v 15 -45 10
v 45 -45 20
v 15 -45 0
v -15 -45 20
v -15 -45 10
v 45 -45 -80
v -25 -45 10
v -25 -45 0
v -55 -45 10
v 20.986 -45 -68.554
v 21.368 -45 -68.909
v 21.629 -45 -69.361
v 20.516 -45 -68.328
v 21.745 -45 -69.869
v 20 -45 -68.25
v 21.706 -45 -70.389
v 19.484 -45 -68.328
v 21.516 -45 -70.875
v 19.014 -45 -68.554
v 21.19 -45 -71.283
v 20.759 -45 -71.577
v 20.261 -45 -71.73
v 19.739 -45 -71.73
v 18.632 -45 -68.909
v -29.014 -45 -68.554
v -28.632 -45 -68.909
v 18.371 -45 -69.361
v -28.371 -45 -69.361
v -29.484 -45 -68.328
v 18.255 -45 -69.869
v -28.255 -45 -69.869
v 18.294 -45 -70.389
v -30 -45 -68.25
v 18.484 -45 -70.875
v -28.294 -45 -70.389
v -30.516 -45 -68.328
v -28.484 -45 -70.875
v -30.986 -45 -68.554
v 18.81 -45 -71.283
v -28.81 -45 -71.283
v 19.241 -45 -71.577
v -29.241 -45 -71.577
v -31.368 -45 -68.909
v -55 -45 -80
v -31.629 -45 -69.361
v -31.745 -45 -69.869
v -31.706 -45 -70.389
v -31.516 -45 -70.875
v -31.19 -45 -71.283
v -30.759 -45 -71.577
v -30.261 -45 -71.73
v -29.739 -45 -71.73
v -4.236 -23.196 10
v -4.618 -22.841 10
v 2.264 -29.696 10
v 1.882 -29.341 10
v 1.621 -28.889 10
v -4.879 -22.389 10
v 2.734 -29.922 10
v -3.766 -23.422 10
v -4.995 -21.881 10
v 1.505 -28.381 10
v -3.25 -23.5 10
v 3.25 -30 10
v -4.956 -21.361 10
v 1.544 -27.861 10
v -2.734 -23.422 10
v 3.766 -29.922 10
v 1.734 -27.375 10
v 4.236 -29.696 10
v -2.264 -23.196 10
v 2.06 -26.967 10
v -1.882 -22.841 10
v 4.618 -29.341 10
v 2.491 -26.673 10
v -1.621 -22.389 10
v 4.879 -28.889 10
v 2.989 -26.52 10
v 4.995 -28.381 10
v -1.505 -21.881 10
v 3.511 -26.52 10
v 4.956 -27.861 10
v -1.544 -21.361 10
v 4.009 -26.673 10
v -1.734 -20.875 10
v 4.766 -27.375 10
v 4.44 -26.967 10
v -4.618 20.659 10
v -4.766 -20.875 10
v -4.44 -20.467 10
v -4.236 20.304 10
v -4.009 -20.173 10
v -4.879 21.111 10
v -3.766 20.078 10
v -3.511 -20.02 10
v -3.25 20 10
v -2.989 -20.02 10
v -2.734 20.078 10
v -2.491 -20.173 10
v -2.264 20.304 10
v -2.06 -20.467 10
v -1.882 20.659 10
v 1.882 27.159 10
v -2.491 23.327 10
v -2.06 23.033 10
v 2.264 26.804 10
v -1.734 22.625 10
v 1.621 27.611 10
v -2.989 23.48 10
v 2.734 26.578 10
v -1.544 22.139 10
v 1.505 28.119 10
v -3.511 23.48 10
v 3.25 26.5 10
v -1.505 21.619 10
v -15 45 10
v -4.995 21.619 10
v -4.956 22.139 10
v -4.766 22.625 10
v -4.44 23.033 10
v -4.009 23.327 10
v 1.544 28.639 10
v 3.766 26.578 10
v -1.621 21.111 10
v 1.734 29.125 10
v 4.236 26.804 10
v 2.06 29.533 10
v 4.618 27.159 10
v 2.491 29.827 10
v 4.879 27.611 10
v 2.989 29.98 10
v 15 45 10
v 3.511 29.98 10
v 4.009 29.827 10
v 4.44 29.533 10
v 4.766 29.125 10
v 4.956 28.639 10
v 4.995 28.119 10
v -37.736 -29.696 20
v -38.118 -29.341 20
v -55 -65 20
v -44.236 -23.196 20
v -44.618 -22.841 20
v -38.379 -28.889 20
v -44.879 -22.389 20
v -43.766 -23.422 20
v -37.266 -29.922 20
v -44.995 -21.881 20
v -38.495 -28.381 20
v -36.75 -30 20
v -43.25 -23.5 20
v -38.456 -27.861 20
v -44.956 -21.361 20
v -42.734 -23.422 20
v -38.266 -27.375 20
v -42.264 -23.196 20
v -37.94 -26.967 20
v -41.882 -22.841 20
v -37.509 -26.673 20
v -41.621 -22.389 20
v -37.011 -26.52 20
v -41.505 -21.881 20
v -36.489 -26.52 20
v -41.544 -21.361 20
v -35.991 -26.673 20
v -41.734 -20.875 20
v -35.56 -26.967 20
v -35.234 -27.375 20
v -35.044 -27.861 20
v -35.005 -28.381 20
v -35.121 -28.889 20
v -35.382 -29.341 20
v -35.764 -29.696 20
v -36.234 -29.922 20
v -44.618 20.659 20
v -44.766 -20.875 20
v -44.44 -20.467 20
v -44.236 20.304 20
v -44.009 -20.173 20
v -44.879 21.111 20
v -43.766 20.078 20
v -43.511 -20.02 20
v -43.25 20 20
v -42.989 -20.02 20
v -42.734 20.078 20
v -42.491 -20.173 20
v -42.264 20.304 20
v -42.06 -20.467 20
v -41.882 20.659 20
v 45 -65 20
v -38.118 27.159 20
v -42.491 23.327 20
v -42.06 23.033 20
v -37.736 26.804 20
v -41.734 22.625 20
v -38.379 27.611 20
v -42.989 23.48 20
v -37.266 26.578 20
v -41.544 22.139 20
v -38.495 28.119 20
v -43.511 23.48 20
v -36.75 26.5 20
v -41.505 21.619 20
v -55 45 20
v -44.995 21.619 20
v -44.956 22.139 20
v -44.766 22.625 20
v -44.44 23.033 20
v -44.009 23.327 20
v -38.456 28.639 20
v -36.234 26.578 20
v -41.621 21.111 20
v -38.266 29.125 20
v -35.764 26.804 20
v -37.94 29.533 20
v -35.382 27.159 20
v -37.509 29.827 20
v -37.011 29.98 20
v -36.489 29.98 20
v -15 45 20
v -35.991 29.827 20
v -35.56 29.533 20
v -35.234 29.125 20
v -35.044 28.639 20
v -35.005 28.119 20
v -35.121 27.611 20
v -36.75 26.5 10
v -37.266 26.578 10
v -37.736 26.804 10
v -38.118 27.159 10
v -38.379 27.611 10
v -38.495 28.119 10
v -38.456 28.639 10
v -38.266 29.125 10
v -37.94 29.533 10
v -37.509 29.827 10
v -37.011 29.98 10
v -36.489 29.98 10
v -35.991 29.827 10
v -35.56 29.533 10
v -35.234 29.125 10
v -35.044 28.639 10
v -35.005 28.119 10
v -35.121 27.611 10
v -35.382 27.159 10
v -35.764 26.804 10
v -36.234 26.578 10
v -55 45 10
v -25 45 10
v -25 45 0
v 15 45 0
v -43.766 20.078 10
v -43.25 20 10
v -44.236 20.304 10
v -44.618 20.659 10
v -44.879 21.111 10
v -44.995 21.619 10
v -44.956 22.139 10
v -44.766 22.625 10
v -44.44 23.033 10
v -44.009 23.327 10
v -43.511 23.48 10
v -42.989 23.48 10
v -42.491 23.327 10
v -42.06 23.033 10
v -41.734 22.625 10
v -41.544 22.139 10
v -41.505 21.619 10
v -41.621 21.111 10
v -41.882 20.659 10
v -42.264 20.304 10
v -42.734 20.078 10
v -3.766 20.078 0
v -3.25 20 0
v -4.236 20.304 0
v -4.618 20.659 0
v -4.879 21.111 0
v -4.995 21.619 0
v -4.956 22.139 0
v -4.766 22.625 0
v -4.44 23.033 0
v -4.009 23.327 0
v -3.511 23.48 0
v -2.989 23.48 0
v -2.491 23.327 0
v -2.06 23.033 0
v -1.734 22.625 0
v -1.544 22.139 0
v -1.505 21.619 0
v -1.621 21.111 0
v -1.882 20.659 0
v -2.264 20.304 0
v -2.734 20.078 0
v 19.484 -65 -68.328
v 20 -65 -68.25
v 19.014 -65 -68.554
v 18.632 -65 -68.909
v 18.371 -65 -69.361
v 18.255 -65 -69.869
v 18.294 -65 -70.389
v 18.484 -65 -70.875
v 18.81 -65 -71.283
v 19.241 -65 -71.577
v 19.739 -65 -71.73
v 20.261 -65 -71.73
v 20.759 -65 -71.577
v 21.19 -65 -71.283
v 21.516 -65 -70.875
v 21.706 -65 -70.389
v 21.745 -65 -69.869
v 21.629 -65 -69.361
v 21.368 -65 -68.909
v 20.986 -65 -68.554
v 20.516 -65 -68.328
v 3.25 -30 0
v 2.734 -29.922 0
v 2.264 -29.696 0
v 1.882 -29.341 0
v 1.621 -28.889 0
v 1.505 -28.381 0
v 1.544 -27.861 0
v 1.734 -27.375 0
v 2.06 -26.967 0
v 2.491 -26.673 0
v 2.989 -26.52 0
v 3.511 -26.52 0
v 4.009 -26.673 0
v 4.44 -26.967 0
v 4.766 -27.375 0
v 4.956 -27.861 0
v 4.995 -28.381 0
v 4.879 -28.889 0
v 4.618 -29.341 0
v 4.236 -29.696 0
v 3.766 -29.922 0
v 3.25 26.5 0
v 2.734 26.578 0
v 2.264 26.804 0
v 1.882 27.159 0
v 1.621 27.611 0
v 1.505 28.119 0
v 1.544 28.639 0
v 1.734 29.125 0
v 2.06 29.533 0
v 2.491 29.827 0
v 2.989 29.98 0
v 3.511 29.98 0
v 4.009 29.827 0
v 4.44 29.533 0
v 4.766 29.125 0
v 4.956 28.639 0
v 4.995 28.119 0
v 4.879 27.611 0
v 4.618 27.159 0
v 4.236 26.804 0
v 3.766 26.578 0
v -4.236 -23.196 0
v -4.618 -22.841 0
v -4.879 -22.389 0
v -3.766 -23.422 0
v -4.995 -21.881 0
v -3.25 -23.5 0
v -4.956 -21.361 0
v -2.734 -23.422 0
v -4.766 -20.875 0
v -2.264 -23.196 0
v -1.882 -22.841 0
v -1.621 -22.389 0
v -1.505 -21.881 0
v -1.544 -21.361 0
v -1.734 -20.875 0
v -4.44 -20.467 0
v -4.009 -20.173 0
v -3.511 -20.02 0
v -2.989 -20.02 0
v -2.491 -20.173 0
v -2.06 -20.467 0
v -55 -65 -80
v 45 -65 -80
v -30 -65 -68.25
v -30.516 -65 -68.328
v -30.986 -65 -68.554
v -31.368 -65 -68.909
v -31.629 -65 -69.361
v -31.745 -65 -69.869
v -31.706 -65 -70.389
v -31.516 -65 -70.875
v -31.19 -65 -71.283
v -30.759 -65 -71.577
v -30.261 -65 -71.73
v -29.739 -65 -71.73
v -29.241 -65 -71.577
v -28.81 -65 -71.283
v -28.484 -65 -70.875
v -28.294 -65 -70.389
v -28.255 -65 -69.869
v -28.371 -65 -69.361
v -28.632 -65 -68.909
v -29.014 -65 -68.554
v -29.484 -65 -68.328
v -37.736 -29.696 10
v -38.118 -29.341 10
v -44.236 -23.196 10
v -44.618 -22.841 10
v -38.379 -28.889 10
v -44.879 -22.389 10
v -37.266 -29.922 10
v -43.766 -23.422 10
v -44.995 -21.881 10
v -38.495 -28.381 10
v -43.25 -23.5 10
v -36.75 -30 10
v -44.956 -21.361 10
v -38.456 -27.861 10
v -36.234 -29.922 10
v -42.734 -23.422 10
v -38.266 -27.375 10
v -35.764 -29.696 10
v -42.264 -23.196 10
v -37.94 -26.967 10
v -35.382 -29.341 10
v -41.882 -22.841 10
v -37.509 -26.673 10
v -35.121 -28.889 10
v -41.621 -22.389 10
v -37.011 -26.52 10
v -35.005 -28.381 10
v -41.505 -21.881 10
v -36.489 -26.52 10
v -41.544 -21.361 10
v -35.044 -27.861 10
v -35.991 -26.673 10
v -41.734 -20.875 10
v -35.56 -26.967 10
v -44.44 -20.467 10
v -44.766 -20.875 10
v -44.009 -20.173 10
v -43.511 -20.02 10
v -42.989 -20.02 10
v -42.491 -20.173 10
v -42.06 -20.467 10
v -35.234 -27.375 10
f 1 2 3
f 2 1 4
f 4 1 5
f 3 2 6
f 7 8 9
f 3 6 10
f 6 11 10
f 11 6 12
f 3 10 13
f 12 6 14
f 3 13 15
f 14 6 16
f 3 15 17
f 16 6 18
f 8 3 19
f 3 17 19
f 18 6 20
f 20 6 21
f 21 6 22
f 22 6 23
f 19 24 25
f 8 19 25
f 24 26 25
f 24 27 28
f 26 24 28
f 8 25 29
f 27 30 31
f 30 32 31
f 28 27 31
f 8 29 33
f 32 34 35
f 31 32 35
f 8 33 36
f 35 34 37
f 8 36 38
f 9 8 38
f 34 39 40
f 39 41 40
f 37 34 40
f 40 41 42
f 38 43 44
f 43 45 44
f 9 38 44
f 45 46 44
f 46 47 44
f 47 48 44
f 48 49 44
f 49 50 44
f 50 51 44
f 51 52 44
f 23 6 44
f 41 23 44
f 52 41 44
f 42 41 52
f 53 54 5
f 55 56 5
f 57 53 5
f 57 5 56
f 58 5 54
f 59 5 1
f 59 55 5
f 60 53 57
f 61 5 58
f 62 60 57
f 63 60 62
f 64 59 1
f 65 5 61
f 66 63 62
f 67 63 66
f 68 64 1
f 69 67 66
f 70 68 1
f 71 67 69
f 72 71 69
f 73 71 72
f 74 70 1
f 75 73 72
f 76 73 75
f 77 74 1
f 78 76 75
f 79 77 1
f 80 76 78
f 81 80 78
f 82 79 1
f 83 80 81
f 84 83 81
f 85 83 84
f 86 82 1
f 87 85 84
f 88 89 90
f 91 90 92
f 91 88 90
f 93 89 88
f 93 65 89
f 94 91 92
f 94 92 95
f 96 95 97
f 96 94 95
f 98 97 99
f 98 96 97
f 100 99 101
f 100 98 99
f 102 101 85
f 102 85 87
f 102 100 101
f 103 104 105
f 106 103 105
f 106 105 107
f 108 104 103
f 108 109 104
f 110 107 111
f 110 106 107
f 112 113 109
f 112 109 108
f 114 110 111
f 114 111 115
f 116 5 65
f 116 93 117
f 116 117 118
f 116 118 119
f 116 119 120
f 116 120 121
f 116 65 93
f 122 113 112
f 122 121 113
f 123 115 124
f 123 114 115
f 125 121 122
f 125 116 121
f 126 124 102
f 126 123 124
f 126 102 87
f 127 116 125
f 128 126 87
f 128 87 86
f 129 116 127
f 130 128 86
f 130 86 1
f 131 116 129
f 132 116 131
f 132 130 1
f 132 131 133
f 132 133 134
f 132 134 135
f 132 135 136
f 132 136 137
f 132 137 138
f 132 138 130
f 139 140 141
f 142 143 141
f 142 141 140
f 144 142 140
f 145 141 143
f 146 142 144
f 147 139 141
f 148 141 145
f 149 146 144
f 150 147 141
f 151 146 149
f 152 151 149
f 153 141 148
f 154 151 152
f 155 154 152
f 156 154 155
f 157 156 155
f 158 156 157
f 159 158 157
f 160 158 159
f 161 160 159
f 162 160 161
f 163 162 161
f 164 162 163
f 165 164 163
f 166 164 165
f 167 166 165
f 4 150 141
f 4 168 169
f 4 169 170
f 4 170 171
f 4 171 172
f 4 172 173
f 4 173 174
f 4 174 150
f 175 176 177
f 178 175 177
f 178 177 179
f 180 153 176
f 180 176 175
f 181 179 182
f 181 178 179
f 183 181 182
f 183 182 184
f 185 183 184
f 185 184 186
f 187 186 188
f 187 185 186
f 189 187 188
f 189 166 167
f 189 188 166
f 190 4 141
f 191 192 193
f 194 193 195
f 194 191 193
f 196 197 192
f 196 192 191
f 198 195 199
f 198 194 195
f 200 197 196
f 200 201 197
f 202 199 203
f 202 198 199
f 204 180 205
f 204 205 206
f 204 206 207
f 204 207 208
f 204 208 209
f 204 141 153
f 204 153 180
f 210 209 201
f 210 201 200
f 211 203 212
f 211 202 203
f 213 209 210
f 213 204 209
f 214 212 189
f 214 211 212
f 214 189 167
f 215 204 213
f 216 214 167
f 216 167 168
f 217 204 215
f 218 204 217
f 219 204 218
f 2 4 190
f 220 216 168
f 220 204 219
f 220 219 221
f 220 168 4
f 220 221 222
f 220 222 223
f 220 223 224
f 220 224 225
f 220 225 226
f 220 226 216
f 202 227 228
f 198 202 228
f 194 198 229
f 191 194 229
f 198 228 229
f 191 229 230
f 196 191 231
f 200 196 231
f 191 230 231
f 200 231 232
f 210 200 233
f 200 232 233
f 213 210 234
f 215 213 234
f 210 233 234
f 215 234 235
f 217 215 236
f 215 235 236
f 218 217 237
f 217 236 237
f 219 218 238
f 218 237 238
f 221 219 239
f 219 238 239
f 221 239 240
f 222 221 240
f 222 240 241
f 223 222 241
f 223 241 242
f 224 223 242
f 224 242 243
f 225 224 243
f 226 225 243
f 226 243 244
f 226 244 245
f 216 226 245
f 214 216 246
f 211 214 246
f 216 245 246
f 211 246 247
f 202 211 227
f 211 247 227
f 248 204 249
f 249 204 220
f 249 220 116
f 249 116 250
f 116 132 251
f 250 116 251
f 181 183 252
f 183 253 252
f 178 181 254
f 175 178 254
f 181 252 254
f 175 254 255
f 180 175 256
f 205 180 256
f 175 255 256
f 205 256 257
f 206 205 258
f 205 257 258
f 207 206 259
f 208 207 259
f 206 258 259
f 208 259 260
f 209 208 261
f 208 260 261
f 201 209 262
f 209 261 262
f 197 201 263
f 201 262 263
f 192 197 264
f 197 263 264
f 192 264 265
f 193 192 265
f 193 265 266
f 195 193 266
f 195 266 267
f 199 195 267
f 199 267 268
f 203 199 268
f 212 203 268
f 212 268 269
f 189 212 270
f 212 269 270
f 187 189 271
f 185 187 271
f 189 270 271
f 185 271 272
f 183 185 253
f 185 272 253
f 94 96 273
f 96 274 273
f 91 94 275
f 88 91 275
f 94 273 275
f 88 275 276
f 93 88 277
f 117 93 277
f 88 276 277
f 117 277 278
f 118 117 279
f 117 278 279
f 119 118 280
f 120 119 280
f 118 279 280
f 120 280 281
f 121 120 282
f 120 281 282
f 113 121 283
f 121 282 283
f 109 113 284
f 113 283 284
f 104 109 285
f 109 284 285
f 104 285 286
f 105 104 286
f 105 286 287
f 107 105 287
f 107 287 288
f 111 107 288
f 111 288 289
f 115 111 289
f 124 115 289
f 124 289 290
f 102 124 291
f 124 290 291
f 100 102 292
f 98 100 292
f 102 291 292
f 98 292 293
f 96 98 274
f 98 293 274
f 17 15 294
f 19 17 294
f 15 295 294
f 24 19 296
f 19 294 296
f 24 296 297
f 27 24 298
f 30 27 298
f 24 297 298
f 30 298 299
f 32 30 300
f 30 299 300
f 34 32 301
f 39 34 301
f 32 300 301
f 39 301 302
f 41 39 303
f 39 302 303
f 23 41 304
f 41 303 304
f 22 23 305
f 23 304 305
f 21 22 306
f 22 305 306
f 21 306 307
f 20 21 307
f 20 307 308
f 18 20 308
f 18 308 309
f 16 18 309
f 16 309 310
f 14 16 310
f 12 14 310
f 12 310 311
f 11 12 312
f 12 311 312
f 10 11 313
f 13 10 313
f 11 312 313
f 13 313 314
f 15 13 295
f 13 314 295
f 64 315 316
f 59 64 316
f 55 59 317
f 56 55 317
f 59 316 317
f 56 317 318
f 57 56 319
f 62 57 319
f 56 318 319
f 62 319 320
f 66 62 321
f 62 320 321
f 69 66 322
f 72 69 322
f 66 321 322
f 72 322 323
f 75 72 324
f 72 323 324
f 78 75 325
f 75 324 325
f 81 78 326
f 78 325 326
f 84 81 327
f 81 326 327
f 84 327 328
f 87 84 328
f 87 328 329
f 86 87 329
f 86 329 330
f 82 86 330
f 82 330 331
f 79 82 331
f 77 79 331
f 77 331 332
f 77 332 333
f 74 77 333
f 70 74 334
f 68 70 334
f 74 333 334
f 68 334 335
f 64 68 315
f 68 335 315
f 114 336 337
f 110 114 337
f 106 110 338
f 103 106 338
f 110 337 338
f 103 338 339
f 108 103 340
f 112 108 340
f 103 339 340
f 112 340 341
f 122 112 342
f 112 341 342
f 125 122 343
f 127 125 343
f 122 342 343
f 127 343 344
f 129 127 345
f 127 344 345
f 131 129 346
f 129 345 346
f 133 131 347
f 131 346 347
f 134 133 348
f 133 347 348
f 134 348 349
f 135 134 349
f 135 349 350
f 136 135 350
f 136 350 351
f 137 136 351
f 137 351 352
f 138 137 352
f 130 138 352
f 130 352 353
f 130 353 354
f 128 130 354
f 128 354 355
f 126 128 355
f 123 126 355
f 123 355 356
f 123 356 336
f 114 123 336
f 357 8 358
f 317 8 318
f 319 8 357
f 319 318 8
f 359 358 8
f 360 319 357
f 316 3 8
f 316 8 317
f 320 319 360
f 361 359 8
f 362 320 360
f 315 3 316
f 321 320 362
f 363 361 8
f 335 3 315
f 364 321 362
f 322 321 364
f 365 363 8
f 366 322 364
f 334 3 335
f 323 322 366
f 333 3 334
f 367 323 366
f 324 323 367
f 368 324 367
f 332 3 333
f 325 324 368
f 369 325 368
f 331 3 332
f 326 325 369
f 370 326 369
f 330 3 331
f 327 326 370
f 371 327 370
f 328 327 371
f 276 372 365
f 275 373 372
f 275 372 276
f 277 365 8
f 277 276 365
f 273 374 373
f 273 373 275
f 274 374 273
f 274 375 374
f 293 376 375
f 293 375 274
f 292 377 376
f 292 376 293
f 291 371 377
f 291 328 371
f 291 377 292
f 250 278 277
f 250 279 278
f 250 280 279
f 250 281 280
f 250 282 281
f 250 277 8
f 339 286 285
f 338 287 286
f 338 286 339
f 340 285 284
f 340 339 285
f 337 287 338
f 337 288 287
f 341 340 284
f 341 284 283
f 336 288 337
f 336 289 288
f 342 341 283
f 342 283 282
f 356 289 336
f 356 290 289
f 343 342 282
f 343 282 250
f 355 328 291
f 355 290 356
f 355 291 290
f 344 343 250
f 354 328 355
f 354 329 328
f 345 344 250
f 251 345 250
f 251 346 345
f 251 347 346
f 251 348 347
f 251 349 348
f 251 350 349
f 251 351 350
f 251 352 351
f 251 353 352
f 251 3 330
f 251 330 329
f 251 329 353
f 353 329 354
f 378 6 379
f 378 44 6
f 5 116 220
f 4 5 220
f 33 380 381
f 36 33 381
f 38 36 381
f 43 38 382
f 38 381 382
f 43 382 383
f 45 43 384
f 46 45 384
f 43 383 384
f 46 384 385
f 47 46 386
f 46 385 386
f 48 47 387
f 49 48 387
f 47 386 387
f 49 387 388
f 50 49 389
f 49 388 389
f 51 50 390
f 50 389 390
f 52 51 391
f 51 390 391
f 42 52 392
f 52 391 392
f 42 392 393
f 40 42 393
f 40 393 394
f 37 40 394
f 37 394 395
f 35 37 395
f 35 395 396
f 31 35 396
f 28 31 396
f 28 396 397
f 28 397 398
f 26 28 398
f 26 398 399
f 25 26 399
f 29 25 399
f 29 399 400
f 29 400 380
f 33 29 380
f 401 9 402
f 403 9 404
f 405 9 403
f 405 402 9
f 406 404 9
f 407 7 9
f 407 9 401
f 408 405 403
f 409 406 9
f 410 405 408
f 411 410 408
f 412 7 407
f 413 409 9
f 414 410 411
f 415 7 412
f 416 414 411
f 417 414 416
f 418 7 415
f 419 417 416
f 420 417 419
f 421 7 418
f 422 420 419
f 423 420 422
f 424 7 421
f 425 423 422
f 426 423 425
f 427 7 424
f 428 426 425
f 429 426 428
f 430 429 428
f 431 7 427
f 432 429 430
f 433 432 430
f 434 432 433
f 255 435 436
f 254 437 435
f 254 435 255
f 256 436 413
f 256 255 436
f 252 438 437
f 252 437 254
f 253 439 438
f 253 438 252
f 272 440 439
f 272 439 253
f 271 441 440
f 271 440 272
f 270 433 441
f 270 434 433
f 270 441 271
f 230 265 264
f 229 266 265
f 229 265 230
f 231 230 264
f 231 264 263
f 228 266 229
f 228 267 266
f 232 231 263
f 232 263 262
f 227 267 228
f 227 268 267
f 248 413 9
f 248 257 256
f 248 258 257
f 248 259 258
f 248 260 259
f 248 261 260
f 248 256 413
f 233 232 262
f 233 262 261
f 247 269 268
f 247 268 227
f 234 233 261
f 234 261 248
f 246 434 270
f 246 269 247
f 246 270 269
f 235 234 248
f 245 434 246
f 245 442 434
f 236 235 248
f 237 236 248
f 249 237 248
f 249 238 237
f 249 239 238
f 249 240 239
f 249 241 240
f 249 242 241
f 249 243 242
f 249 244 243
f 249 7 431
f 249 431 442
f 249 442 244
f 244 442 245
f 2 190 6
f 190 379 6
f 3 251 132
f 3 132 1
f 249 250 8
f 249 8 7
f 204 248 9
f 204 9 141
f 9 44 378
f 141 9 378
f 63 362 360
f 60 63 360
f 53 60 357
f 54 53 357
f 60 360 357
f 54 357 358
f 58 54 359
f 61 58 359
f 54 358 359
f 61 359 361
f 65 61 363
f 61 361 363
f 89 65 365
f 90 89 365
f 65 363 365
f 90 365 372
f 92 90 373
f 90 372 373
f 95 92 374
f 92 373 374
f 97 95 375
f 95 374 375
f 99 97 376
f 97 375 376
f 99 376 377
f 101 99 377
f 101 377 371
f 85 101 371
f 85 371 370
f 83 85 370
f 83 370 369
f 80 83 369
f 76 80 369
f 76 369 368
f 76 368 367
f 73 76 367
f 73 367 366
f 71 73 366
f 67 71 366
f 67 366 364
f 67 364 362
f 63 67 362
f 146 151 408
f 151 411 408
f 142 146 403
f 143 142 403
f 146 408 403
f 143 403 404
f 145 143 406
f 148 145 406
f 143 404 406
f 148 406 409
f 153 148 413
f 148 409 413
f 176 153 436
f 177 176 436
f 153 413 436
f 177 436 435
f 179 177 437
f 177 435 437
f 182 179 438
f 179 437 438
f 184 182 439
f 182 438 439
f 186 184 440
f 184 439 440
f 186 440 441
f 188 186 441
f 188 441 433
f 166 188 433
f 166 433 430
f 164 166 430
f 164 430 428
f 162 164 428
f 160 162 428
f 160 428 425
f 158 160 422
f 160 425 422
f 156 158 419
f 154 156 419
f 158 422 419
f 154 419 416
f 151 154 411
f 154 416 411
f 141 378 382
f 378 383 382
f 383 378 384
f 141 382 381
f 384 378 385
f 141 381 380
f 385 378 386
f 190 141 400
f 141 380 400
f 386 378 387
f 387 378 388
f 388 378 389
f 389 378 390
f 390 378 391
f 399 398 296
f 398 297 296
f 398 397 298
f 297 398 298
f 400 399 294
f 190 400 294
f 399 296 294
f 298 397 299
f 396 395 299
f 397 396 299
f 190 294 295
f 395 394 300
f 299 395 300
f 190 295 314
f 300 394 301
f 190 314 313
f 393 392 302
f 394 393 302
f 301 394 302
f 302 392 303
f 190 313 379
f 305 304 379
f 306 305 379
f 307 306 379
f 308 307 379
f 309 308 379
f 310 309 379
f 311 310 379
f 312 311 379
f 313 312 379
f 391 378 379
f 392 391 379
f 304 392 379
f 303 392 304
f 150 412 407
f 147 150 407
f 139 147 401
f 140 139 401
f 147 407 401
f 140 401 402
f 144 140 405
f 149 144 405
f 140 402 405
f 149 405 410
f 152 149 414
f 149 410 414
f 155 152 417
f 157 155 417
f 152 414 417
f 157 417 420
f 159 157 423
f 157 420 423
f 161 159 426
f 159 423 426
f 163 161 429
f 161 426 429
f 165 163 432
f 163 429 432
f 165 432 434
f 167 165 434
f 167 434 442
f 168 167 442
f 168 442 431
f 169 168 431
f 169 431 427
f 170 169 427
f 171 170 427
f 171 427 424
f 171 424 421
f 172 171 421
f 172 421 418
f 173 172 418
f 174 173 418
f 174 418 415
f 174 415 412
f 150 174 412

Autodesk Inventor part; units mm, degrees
ref_plane "YZ Plane" through (0, 0, 0) normal (1, 0, 0) x (0, 1, 0)
ref_plane "XZ Plane" through (0, 0, 0) normal (0, 1, 0) x (-1, 0, 0)
ref_plane "XY Plane" through (0, 0, 0) normal (0, 0, 1) x (1, 0, 0)
sketch "Boceto1" plane through (0, 0, 0) normal (0, 0, 1) x (1, 0, 0)
  line L0 (-15, 45) -> (15, 45)
  line L1 (15, 45) -> (15, -45)
  line L2 (15, -45) -> (-15, -45)
  line L3 (-15, -45) -> (-15, 45)
  line L4 (-15, 45) -> (15, -45) construction
  line L5 (15, 45) -> (-15, -45) construction
  point P0 (0, 0)
  dimension "d0" = 30
  dimension "d1" = 90
extrude "Extrusión1" add sketch "Boceto1" along normal blind 10
sketch "Boceto2" plane through (0, 0, 10) normal (0, 0, 1) x (1, 0, 0)
  line L0 (15, 45) -> (15, -45)
  line L1 (5, 30) -> (5, 20)
  line L2 (-5, 30) -> (5, 30)
  line L3 (5, 20) -> (-5, 30) construction
  line L4 (5, 20) -> (-5, 20)
  line L5 (-5, 20) -> (5, 30) construction
  line L6 (-5, 20) -> (-5, 30)
  line L7 (24, 0) -> (9, 0)
  line L8 (-15, -45) -> (15, -45)
  line L9 (5, 25) -> (5.4102, 25)
  circle A0 centre (-3.25, 21.75) radius 1.75
  circle A1 centre (3.25, 28.25) radius 1.75
  line L10 (5, -20) -> (-5, -20)
  circle A2 centre (-3.25, -21.75) radius 1.75
  line L11 (5, -25) -> (5.4102, -25)
  line L12 (5, -30) -> (5, -20)
  line L13 (-5, -30) -> (5, -30)
  line L14 (5, -20) -> (-5, -30) construction
  line L15 (-5, -20) -> (5, -30) construction
  line L16 (-5, -20) -> (-5, -30)
  circle A3 centre (3.25, -28.25) radius 1.75
  line L17 (-15, -45) -> (-15, 45)
  line L18 (15, -45) -> (15, 45) projected
  line L19 (-15, -45) -> (15, -45) projected
  line L20 (-15, 45) -> (15, 45)
  line L21 (-3.25, 28.25) -> (3.25, 21.75)
  line L22 (-3.25, 21.75) -> (3.25, 28.25)
  point P0 (0, 0)
  point P1 (-113, 215)
  point P2 (-5, 25)
  point P3 (-3.25, -21.75)
  point P4 (3.25, -28.25)
  point P5 (-143, 115)
  point P6 (-3.25, -21.75)
  point P7 (-5, -25)
  point P8 (3.25, -28.25)
  point P9 (0, 25)
  point P10 (0, -25)
  dimension "d4" = 1.75
  dimension "d5" = 1.75
  dimension "d6" = 1.75
  dimension "d7" = 1.75
  dimension "d8" = 10
  dimension "d9" = 10
  dimension "d10" = 10
  dimension "d11" = 15
  dimension "d12" = 0
  dimension "d13" = 30
  dimension "d14" = 0
  dimension "d15" = 90
  dimension "d16" = 15
hole "Agujero1" at (3.25, 28.25, 10) at (-3.25, 21.75, 10) at (-3.25, -21.75, 10) at (3.25, -28.25, 10) direction (0, 0, -1) diameter 3.5 end through all
sketch "Boceto3" plane through (-15, -45, 0) normal (-1, 0, 0) x (0, 0, 1)
  line L0 (0, 0) -> (0, 90) projected
  line L1 (0, 90) -> (20, 90)
  line L2 (20, 90) -> (20, 0)
  line L3 (20, 0) -> (0, 0)
  line L4 (0, 0) -> (0, 90)
  point P0 (0, 45)
  dimension "d24" = 20
  dimension "d25" = 90
extrude "Extrusión2" add sketch "Boceto3" along normal blind 10
sketch "Boceto4" plane through (-25, -45, 0) normal (-1, 0, 0) x (0, 0, 1)
  line L0 (20, 90) -> (10, 90) projected
  line L1 (10, 0) -> (10, 90) projected
  line L2 (20, 90) -> (10, 90)
  line L3 (10, 90) -> (10, 0)
  line L4 (10, 0) -> (20, 0)
  line L5 (20, 0) -> (20, 90)
  point P0 (0, 45)
extrude "Extrusión3" add sketch "Boceto4" along normal blind 30
sketch "Boceto5" plane through (-15, -45, 20) normal (0, 0, 1) x (1, 0, 0)
  line L0 (-40, 0) -> (-70, 90)
  line L1 (-70, 90) -> (-40, 0)
  line L2 (-20, 75) -> (-20, 65)
  line L3 (-30, 75) -> (-20, 75)
  line L4 (-20, 65) -> (-30, 75) construction
  line L5 (-20, 65) -> (-30, 65)
  line L6 (-30, 65) -> (-20, 75) construction
  circle A0 centre (-28.25, 66.75) radius 1.75
  line L7 (-30, 65) -> (-30, 75)
  circle A1 centre (-21.75, 73.25) radius 1.75
  line L8 (-40, -20) -> (-40, 90)
  line L9 (-55, 45) -> (-143, 45)
  line L10 (-20, 25) -> (-30, 25)
  circle A2 centre (-28.25, 23.25) radius 1.75
  line L11 (-20, 15) -> (-20, 25)
  line L12 (-20, 25) -> (-30, 15) construction
  line L13 (-30, 25) -> (-20, 15) construction
  line L14 (-30, 25) -> (-30, 15)
  line L15 (-30, 15) -> (-20, 15)
  circle A3 centre (-21.75, 16.75) radius 1.75
  line L16 (-70, 0) -> (-40, 0)
  line L17 (0, 0) -> (-40, 0) projected
  line L18 (-40, 90) -> (-70, 90)
  line L19 (-40, 0) -> (-40, 90) projected
  point P0 (15, 45)
  point P1 (-30, 70)
  point P2 (-20, 70)
  point P3 (-20, 20)
  point P4 (-30, 20)
  point P5 (-55, 0)
  point P6 (-55, 90)
  dimension "d30" = 3.5
  dimension "d31" = 1.75
  dimension "d32" = 1.75
  dimension "d33" = 1.75
  dimension "d34" = 1.75
  dimension "d35" = 10
  dimension "d36" = 10
  dimension "d38" = 10
  dimension "d39" = -41.1096
  dimension "d40" = 15
  dimension "d41" = 0
  dimension "d42" = 15
  dimension "d43" = 90
  dimension "d45" = 0
hole "Agujero2" at (-36.75, 28.25, 20) at (-43.25, 21.75, 20) at (-43.25, -21.75, 20) at (-36.75, -28.25, 20) direction (0, 0, -1) diameter 3.5 end through all
sketch "Boceto6" plane through (-15, -45, 20) normal (0, 0, 1) x (1, 0, 0)
  line L0 (-10, 0) -> (-40, 0) projected
  line L1 (-40, 0) -> (60, 0)
  line L2 (60, 0) -> (60, -20)
  line L3 (60, -20) -> (-40, -20)
  line L4 (-40, -20) -> (-40, 0)
  point P0 (15, 45)
  dimension "d53" = 20
extrude "Extrusión4" add sketch "Boceto6" against normal blind 100
mirror "Simetría1" about plane through (-5, -55, -80) normal (0, 0, -1) of "Extrusión1", "Agujero1", "Extrusión2", "Agujero2", "Extrusión3", "Extrusión4"
ref_plane "Plano de trabajo2" through (45, -65, -80) normal (0, 0, -1) x (-1, 0, 0)
sketch "Boceto7" plane through (-15, -45, 20) normal (0, 1, 0) x (1, 0, 0)
  line L0 (30, 115) -> (30, 85)
  circle A0 centre (35, 90) radius 1.75
  line L1 (30, 85) -> (40, 85)
  line L2 (35, 110) -> (35, 90)
  circle A1 centre (35, 110) radius 1.75
  line L3 (40, 115) -> (30, 85) construction
  line L4 (40, 115) -> (30, 115)
  line L5 (30, 115) -> (40, 85) construction
  line L6 (40, 85) -> (40, 115)
  line L7 (60, 0) -> (60, 200) projected
  line L8 (-40, 0) -> (60, 0) projected
  line L9 (10, 0) -> (10, 134.4524)
  line L10 (-10, 115) -> (-10, 85)
  circle A2 centre (-15, 110) radius 1.75
  line L11 (-20, 115) -> (-10, 115)
  circle A3 centre (-15, 90) radius 1.75
  line L12 (-10, 85) -> (-20, 85)
  line L13 (-20, 115) -> (-10, 85) construction
  line L14 (-10, 115) -> (-20, 85) construction
  line L15 (-20, 85) -> (-20, 115)
  line L16 (-15, 110) -> (-15, 90)
  point P0 (15, 20)
  point P1 (189.1833, 40)
  point P2 (35, 115)
  point P3 (-85.8367, 100)
  point P4 (235.02, 100)
  point P5 (-15, 115)
  dimension "d56" = 5
  dimension "d57" = 5
  dimension "d58" = 3.5
  dimension "d59" = 5
  dimension "d60" = 5
  dimension "d61" = 10
  dimension "d62" = 30
  dimension "d64" = 20
hole "Agujero3" at (-30, -45, -90) at (-30, -45, -70) at (20, -45, -90) at (20, -45, -70) direction (0, -1, 0) diameter 3.5 end through all
split "Dividir1" plane through (45, -65, -80) removes the side toward (0, 0, -1)
properties part number "container_mid_2"
